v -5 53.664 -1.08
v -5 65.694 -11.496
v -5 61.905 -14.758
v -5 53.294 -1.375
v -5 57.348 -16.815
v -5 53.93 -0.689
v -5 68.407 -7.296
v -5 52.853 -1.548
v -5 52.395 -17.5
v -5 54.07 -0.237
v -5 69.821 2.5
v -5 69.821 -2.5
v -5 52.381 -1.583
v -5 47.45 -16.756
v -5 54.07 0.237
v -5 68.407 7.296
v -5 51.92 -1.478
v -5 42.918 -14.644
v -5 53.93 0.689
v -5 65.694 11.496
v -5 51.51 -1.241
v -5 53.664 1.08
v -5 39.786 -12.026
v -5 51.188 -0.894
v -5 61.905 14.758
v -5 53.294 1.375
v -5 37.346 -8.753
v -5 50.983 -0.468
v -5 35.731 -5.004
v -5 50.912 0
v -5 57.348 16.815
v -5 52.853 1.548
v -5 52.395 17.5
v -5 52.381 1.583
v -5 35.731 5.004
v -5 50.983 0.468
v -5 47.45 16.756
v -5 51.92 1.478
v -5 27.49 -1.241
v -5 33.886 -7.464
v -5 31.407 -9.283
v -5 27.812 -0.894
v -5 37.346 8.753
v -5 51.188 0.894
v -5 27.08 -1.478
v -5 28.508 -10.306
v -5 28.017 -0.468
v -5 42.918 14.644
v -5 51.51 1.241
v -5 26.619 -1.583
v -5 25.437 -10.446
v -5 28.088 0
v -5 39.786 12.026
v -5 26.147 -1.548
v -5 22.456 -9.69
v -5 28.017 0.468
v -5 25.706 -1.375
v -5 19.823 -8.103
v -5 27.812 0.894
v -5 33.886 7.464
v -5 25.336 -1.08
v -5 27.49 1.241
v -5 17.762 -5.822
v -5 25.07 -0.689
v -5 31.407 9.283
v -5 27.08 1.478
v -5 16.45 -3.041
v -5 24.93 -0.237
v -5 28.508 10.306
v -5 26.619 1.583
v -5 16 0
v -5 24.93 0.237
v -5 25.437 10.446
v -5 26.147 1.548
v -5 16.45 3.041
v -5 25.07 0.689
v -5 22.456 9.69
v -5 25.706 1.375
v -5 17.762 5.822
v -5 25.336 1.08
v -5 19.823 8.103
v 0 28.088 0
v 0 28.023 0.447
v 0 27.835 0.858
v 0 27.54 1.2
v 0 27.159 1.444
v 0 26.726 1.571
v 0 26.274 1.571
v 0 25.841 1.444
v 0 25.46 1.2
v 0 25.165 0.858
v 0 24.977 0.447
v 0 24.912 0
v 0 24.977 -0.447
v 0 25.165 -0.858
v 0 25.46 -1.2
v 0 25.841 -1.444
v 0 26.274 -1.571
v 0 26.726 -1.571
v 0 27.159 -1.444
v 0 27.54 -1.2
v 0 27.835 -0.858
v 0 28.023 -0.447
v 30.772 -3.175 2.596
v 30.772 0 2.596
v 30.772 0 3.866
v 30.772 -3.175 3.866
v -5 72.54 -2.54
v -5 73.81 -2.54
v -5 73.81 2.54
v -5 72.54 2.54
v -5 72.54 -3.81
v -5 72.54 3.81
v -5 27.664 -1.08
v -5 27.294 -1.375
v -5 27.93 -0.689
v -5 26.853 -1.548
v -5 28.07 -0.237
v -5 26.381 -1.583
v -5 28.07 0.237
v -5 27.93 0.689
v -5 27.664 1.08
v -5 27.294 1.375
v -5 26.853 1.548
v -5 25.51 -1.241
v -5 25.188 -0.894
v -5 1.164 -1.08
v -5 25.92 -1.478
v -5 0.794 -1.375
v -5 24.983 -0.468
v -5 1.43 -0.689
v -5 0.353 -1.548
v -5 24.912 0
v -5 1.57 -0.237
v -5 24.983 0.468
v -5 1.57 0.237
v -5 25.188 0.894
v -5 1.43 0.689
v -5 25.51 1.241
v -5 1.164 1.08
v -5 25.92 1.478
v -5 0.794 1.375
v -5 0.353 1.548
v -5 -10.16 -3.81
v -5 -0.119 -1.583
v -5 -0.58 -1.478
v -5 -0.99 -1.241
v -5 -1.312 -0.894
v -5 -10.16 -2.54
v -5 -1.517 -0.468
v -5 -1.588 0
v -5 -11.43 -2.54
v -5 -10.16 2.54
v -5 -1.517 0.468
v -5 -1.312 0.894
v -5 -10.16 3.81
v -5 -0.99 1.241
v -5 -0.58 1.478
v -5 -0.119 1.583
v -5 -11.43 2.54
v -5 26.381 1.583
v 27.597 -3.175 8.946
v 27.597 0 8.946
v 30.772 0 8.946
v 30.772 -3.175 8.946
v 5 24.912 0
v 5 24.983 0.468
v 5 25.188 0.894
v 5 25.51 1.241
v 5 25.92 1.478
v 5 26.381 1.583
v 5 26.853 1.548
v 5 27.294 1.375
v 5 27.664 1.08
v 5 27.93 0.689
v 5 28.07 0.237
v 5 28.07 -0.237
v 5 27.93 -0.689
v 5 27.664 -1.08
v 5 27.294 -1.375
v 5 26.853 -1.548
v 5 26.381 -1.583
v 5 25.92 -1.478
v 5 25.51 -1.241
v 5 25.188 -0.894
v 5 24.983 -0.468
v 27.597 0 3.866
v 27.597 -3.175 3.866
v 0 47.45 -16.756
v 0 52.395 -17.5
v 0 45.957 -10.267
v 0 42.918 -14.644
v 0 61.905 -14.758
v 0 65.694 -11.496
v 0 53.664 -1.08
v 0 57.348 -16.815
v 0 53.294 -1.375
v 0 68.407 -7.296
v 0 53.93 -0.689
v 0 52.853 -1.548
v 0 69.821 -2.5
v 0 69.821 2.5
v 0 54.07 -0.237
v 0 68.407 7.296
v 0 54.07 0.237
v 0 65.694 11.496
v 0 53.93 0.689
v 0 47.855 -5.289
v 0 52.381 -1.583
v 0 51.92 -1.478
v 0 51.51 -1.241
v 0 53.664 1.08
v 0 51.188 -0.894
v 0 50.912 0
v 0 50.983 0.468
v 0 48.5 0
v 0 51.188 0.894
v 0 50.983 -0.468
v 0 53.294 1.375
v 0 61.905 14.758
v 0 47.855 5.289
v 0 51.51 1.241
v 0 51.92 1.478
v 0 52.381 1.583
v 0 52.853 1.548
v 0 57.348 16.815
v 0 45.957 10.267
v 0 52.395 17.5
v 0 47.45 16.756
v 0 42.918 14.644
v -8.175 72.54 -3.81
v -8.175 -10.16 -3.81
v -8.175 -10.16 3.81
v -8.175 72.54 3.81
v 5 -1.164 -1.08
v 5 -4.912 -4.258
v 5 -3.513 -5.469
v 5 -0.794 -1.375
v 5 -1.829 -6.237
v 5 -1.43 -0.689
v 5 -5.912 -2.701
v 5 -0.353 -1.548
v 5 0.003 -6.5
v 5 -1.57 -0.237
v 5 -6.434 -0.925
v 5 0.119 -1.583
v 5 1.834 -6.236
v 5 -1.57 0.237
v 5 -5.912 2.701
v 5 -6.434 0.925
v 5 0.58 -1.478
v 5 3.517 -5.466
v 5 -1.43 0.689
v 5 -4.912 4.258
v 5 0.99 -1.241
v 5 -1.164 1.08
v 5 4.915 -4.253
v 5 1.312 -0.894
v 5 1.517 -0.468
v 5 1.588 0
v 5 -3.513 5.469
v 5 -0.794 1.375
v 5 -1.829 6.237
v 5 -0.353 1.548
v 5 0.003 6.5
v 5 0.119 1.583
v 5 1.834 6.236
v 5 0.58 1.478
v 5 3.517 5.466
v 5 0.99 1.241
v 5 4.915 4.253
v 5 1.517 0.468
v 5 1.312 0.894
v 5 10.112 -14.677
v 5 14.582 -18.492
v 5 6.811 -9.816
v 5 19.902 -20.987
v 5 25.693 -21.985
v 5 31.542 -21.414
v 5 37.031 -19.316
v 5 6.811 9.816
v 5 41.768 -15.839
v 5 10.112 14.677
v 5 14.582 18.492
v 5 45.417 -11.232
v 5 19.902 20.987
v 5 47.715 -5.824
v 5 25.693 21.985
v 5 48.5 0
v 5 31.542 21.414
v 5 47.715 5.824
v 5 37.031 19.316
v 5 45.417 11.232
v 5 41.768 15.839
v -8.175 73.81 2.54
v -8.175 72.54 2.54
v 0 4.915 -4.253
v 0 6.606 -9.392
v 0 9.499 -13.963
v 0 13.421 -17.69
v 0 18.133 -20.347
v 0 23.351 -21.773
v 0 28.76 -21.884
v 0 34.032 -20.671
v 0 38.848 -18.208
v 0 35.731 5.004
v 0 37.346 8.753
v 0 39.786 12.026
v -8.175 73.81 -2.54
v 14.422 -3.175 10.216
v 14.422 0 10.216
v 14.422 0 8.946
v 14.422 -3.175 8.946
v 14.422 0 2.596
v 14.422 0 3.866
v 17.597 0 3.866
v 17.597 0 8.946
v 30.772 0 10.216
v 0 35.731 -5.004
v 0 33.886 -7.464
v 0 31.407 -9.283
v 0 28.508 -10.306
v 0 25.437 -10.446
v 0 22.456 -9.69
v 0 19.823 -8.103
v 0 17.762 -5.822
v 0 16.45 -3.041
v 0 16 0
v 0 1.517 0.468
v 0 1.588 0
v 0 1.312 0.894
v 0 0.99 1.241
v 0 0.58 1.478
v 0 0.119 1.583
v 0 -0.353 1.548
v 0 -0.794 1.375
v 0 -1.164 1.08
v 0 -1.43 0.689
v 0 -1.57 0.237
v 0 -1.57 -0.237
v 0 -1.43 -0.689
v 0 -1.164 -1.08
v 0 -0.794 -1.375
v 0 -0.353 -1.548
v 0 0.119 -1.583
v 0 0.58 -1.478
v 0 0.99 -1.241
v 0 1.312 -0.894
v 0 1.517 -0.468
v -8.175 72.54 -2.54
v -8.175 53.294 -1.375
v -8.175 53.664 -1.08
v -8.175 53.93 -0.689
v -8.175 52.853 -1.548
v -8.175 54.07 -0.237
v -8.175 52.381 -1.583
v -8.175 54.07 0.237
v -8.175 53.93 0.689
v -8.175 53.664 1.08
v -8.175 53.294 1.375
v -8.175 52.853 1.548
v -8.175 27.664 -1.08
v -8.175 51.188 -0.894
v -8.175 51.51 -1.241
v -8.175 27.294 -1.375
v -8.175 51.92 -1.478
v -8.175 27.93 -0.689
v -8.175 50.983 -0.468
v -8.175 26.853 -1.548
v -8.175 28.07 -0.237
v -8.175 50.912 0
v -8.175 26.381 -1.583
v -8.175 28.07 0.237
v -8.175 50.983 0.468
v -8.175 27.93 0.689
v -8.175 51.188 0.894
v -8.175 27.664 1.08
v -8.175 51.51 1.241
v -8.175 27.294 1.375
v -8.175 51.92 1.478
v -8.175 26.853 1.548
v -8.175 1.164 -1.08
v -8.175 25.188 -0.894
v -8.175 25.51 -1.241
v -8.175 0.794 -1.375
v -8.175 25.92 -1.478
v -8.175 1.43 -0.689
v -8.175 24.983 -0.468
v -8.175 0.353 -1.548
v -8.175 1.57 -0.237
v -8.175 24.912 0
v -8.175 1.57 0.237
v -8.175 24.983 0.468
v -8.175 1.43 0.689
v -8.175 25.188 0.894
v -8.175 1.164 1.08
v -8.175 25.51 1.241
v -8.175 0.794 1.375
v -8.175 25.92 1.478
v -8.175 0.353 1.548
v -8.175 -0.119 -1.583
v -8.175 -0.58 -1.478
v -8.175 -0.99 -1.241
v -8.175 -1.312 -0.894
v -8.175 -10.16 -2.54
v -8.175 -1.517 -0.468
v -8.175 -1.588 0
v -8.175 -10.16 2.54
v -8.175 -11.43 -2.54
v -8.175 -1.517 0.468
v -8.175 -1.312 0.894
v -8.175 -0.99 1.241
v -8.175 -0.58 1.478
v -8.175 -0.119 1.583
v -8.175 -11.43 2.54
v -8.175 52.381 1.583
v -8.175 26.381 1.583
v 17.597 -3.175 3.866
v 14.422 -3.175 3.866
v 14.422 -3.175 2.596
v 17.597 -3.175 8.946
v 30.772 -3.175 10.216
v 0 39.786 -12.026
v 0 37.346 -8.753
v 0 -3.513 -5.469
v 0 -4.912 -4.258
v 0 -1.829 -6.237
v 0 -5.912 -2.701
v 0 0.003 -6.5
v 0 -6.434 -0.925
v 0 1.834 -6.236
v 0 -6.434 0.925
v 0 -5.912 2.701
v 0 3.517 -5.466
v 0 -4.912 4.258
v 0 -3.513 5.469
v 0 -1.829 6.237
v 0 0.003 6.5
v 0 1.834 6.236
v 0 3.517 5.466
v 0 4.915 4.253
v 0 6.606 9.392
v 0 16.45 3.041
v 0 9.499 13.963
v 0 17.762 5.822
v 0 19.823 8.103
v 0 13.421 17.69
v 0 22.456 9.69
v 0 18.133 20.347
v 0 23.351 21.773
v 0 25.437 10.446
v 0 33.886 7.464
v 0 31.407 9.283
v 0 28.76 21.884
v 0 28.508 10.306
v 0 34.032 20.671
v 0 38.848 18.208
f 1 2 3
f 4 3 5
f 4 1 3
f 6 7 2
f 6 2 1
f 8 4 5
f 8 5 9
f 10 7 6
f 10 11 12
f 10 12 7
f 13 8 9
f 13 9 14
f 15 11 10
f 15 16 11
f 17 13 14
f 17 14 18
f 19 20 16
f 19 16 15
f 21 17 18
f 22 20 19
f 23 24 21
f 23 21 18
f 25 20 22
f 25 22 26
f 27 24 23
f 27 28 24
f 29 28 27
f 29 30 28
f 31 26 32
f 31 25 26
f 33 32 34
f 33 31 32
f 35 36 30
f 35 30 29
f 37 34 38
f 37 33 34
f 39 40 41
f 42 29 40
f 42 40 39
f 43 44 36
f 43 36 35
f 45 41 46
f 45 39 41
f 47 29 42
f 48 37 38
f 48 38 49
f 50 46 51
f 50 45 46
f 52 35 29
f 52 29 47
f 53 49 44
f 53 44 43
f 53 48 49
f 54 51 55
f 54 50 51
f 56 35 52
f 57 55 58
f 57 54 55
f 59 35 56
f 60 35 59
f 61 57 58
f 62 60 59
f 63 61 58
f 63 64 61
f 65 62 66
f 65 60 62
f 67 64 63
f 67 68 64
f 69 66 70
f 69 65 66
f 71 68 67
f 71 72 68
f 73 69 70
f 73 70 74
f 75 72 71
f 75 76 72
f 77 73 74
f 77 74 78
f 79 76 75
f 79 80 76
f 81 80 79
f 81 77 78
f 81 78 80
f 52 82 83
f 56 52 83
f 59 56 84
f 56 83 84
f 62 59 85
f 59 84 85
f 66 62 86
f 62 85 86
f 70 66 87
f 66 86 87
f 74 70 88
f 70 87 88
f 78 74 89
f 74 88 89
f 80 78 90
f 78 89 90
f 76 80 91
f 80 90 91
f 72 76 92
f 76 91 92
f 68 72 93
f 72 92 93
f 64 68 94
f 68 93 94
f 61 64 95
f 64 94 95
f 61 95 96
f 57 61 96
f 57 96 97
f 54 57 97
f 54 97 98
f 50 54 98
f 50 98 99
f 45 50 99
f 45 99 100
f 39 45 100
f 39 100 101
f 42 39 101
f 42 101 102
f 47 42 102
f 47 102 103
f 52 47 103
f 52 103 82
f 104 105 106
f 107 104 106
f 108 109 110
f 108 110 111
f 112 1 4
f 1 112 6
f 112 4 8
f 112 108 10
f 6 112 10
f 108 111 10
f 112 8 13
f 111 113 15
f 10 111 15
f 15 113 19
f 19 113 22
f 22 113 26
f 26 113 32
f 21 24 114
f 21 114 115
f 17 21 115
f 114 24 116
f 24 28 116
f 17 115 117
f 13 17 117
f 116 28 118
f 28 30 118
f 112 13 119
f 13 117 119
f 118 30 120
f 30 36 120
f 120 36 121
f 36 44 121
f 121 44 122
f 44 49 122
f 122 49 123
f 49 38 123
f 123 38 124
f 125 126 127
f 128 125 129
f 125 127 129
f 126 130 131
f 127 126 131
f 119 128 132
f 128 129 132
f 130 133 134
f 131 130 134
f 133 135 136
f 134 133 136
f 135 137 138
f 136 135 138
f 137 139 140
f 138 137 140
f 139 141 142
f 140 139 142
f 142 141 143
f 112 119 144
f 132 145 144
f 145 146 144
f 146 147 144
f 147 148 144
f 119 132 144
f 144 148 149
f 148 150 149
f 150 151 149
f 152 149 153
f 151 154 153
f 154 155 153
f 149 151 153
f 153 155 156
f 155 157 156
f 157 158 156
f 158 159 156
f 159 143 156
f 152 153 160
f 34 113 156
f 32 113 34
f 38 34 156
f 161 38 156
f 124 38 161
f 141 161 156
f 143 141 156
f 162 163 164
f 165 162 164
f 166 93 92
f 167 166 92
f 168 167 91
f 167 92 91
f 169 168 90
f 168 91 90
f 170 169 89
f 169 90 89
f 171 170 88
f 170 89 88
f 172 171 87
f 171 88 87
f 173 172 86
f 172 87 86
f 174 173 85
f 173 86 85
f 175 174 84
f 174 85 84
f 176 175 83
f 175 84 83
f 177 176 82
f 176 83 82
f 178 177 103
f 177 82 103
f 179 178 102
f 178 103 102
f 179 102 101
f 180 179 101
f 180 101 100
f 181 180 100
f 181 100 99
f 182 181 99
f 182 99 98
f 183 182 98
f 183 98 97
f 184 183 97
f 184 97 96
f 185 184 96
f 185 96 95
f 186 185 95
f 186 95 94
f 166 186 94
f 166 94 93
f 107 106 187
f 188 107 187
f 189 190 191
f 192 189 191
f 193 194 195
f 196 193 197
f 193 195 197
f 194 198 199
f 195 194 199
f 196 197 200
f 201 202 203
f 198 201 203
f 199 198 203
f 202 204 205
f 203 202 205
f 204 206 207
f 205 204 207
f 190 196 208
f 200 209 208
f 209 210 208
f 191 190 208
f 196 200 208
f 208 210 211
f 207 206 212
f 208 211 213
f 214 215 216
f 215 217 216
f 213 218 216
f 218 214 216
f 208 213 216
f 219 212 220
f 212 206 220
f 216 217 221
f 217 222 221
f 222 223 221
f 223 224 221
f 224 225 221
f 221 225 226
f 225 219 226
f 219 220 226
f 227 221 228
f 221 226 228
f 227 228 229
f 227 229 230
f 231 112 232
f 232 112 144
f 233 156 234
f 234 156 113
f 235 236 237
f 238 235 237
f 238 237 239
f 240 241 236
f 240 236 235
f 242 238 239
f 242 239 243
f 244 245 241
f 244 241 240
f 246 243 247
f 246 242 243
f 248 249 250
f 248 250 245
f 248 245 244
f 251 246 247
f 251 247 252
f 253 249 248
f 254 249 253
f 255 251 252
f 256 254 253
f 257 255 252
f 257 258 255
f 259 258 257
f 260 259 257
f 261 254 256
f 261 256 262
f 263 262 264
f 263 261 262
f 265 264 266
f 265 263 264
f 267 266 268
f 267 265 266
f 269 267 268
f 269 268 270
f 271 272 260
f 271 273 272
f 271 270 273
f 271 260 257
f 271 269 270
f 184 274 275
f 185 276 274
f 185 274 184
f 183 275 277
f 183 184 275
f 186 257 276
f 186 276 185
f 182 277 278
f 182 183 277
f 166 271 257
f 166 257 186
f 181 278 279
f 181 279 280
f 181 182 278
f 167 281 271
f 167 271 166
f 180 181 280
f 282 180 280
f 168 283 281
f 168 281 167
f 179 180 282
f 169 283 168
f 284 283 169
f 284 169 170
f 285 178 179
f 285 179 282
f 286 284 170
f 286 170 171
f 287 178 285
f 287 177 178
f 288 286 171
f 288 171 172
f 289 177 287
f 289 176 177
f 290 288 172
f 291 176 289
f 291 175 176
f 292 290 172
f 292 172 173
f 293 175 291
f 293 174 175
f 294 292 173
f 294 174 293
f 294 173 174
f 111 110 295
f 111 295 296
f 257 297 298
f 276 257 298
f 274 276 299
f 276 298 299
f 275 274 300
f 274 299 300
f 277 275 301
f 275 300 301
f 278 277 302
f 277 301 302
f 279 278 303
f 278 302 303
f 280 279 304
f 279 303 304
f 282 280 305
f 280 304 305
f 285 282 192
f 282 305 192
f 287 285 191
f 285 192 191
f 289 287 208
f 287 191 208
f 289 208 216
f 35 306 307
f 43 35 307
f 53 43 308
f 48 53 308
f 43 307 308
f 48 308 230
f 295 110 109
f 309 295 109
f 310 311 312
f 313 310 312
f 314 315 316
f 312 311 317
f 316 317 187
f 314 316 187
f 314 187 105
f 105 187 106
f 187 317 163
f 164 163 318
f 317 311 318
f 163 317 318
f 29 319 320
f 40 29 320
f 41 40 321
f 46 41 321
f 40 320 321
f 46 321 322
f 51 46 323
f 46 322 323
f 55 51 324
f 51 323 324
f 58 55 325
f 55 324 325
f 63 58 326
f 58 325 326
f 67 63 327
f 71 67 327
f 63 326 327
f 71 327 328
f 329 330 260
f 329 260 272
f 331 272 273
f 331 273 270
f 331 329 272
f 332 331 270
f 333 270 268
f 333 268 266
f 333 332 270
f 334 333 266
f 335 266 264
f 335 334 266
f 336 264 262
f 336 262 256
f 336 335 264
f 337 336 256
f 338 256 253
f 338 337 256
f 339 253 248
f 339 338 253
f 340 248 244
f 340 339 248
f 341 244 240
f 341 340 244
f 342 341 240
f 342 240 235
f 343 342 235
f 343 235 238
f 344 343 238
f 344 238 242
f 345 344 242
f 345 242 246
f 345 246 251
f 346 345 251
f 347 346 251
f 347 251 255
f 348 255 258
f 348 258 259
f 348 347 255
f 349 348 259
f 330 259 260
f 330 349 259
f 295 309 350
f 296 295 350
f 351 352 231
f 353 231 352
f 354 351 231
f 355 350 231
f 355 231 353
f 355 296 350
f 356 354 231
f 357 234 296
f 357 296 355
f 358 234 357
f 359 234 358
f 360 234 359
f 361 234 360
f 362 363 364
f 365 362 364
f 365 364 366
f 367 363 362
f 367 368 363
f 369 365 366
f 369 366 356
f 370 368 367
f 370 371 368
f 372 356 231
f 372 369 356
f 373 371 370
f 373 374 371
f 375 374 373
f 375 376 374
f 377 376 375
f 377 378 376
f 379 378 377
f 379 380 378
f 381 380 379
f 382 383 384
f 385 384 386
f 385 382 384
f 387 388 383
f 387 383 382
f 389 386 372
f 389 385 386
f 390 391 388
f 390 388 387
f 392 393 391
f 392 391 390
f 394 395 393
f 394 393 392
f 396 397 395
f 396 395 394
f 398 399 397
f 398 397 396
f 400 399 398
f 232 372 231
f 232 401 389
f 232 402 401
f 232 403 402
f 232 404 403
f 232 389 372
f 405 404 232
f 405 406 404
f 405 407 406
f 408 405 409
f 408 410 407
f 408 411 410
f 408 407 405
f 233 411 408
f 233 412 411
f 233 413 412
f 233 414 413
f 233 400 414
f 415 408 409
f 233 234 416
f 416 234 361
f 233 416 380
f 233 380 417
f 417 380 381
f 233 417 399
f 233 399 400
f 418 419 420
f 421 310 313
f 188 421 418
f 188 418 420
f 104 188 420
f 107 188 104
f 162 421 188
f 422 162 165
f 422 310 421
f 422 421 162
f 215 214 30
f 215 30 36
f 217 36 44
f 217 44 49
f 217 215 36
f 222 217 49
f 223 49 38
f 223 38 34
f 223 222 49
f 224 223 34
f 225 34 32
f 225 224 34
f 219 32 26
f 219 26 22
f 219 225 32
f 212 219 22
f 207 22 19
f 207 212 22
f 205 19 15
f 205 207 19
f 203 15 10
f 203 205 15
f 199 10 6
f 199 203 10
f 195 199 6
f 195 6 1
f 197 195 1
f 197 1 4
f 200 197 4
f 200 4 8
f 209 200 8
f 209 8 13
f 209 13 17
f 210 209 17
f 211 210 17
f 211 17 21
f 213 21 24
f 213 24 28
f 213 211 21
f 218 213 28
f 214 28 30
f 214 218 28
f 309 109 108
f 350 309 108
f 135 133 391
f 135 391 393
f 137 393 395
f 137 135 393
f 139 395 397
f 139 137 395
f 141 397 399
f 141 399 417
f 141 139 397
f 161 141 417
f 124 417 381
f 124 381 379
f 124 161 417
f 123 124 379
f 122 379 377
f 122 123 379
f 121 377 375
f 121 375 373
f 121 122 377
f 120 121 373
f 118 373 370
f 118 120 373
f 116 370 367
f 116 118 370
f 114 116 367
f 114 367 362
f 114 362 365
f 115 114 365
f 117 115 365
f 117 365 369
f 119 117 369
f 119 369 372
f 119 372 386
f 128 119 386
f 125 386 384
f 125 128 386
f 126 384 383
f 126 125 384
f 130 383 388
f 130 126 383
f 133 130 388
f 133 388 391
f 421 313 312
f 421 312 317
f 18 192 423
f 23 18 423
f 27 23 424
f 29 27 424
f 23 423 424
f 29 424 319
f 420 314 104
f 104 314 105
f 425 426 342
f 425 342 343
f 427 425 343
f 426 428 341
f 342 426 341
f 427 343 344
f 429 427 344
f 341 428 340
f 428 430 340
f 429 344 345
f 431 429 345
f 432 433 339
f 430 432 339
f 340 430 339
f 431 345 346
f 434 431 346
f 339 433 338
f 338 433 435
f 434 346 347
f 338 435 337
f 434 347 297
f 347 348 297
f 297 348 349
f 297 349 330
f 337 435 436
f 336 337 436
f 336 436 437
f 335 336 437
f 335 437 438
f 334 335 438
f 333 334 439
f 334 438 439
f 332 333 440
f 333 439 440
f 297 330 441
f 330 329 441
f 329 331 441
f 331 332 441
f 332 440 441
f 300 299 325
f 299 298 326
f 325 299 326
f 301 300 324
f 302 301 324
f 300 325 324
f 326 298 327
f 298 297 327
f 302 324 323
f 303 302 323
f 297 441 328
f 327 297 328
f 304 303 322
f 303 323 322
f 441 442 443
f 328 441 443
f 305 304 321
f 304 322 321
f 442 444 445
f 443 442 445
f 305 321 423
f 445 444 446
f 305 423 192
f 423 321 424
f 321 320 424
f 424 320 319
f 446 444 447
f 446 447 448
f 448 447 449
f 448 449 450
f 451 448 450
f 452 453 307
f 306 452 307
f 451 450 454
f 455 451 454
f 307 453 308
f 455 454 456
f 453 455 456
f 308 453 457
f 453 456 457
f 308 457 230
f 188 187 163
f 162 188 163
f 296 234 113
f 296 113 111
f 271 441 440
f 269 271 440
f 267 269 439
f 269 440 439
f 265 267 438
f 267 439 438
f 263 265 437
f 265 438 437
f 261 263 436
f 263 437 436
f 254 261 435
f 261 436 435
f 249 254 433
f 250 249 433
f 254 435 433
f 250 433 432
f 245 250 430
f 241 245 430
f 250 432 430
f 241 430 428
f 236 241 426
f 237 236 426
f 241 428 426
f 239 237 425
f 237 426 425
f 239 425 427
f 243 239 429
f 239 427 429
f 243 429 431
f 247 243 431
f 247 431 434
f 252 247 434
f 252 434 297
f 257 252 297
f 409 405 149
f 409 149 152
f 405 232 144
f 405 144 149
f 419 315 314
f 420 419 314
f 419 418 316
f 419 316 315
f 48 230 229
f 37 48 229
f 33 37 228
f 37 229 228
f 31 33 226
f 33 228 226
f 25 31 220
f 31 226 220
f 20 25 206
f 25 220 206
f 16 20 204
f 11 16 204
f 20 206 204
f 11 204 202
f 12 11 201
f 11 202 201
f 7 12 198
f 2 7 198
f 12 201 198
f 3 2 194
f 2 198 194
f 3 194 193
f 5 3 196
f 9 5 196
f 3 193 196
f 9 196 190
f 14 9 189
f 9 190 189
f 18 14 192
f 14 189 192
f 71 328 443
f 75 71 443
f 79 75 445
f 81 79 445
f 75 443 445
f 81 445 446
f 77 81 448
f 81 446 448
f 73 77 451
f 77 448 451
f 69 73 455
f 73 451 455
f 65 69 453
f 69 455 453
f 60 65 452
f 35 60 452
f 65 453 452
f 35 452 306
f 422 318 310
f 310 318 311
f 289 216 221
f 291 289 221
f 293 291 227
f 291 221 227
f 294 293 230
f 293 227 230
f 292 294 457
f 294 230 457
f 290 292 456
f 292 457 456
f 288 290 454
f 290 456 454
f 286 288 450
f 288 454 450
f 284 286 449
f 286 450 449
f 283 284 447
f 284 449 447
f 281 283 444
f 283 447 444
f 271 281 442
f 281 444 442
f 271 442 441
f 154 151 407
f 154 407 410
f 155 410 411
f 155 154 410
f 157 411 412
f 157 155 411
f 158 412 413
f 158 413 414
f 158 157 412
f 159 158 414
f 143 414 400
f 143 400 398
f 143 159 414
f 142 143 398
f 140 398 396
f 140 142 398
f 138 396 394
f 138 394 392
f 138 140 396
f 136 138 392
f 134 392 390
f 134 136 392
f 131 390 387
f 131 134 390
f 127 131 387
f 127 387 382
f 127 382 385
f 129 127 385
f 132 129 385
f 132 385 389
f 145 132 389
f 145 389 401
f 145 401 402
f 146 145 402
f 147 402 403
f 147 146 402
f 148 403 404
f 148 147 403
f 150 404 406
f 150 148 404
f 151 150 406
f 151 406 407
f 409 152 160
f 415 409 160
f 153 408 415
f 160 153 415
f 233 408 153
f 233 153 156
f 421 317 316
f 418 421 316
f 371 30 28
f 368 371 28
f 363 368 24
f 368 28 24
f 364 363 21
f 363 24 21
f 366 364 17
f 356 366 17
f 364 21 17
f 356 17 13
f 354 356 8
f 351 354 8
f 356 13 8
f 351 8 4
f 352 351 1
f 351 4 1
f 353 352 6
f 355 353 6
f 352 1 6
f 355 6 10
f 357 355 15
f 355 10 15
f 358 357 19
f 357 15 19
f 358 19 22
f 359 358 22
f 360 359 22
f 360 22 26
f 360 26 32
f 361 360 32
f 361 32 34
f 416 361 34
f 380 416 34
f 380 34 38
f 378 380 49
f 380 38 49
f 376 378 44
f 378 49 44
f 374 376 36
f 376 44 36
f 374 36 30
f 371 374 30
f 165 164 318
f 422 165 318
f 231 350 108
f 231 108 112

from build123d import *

# Parameters (mm, degrees)
F0_R     = 4.5
F0_R_2   = 1.5875
F1_DEPTH = 5
F2_R     = 1.5875
F3_DEPTH = 5
F4_R     = 1.5875
F4_W     = 1.27
F4_H     = 2.54
F5_DEPTH = 3.175
F7_DEPTH = 3.175


with BuildPart() as f1:
    # F0 (on Right) → F1 (new body)
    with BuildSketch(Plane.YZ):
        with BuildLine():
            ThreePointArc((4.9150943396, 4.2534512613), (6.0908994905, 2.2695689891), (6.5, 0))
            ThreePointArc((6.5, 0), (6.0908994905, -2.2695689891), (4.9150943396, -4.2534512613))
            ThreePointArc((4.9150943396, -4.2534512613), (28.6368288972, -21.8959805047), (48.5, 0))
            ThreePointArc((48.5, 0), (28.6368288972, 21.8959805047), (4.9150943396, 4.2534512613))
        make_face()
        with BuildLine():
            ThreePointArc((46.5, 0), (26.5, -20), (6.5, 0))
            ThreePointArc((6.5, 0), (26.5, 20), (46.5, 0))
        make_face(mode=Mode.SUBTRACT)
        with BuildLine():
            ThreePointArc((46.5, 0), (26.5, 20), (6.5, 0))
            ThreePointArc((6.5, 0), (26.5, -20), (46.5, 0))
        make_face()
        with BuildLine():
            ThreePointArc((28.0875, 0), (26.5, -1.5875), (24.9125, 0))
            ThreePointArc((24.9125, 0), (26.5, 1.5875), (28.0875, 0))
        make_face(mode=Mode.SUBTRACT)
        with BuildLine():
            ThreePointArc((4.5, 0), (4.6040194953, 2.1368288972), (4.9150943396, 4.2534512613))
            ThreePointArc((4.9150943396, 4.2534512613), (-6.5, 0), (4.9150943396, -4.2534512613))
            ThreePointArc((4.9150943396, -4.2534512613), (4.6040194953, -2.1368288972), (4.5, 0))
        make_face()
        Circle(F0_R, mode=Mode.SUBTRACT)
        Circle(F0_R)
        Circle(F0_R_2, mode=Mode.SUBTRACT)
        with BuildLine():
            Line((4.5, 0), (6.5, 0))
            ThreePointArc((6.5, 0), (6.0908994905, 2.2695689891), (4.9150943396, 4.2534512613))
            ThreePointArc((4.9150943396, 4.2534512613), (4.6040194953, 2.1368288972), (4.5, 0))
        make_face()
        with BuildLine():
            ThreePointArc((4.9150943396, -4.2534512613), (6.0908994905, -2.2695689891), (6.5, 0))
            Line((6.5, 0), (4.5, 0))
            ThreePointArc((4.5, 0), (4.6040194953, -2.1368288972), (4.9150943396, -4.2534512613))
        make_face()
    extrude(amount=F1_DEPTH)

    # F2 (on face) → F3 (join)
    with BuildSketch(Plane(origin=(0, 0, 0), x_dir=(0, -1, 0), z_dir=(-1, 0, 0))):
        with BuildLine():
            ThreePointArc((-44.1875, -13.0825205427), (-47.3940781084, -6.887488657), (-48.5, 0))
            ThreePointArc((-48.5, 0), (-47.3940781084, 6.887488657), (-44.1875, 13.0825205427))
            ThreePointArc((-44.1875, 13.0825205427), (-68, 0), (-44.1875, -13.0825205427))
        make_face()
        with Locations((-52.5, 0)):
            Circle(F2_R, mode=Mode.SUBTRACT)
        with BuildLine():
            ThreePointArc((-35.7307692308, 5.004288102), (-35.1836560085, 2.5286816267), (-35, 0))
            ThreePointArc((-35, 0), (-35.1836560085, -2.5286816267), (-35.7307692308, -5.004288102))
            ThreePointArc((-35.7307692308, -5.004288102), (-23.9186318476, -10.1777472194), (-16, 0))
            ThreePointArc((-16, 0), (-23.9186318476, 10.1777472194), (-35.7307692308, 5.004288102))
        make_face()
        with BuildLine():
            ThreePointArc((-35, 0), (-26.5, 8.5), (-18, 0))
            ThreePointArc((-18, 0), (-26.5, -8.5), (-35, 0))
        make_face(mode=Mode.SUBTRACT)
        with BuildLine():
            ThreePointArc((-35, 0), (-26.5, -8.5), (-18, 0))
            ThreePointArc((-18, 0), (-26.5, 8.5), (-35, 0))
        make_face()
        with BuildLine():
            ThreePointArc((-24.9125, 0), (-26.5, -1.5875), (-28.0875, 0))
            ThreePointArc((-28.0875, 0), (-26.5, 1.5875), (-24.9125, 0))
        make_face(mode=Mode.SUBTRACT)
        with BuildLine():
            ThreePointArc((-44.1875, -13.0825205427), (-68, 0), (-44.1875, 13.0825205427))
            ThreePointArc((-44.1875, 13.0825205427), (-43.5707428158, 13.8776705436), (-42.9182692308, 14.643784875))
            ThreePointArc((-42.9182692308, 14.643784875), (-70, 0), (-42.9182692308, -14.643784875))
            ThreePointArc((-42.9182692308, -14.643784875), (-43.5707428158, -13.8776705436), (-44.1875, -13.0825205427))
        make_face()
        with BuildLine():
            ThreePointArc((-44.1875, -13.0825205427), (-38.9151969098, -7.4634526193), (-37, 0))
            Line((-37, 0), (-48.5, 0))
            ThreePointArc((-48.5, 0), (-47.3940781084, -6.887488657), (-44.1875, -13.0825205427))
        make_face()
        with BuildLine():
            Line((-48.5, 0), (-37, 0))
            ThreePointArc((-37, 0), (-38.9151969098, 7.4634526193), (-44.1875, 13.0825205427))
            ThreePointArc((-44.1875, 13.0825205427), (-47.3940781084, 6.887488657), (-48.5, 0))
        make_face()
        with BuildLine():
            ThreePointArc((-44.1875, 13.0825205427), (-38.9151969098, 7.4634526193), (-37, 0))
            ThreePointArc((-37, 0), (-36.6777472194, 2.5813681524), (-35.7307692308, 5.004288102))
            ThreePointArc((-35.7307692308, 5.004288102), (-38.4706283815, 10.4607233015), (-42.9182692308, 14.643784875))
            ThreePointArc((-42.9182692308, 14.643784875), (-43.5707428158, 13.8776705436), (-44.1875, 13.0825205427))
        make_face()
        with BuildLine():
            ThreePointArc((-35.7307692308, -5.004288102), (-36.6777472194, -2.5813681524), (-37, 0))
            ThreePointArc((-37, 0), (-38.9151969098, -7.4634526193), (-44.1875, -13.0825205427))
            ThreePointArc((-44.1875, -13.0825205427), (-43.5707428158, -13.8776705436), (-42.9182692308, -14.643784875))
            ThreePointArc((-42.9182692308, -14.643784875), (-38.4706283815, -10.4607233015), (-35.7307692308, -5.004288102))
        make_face()
        with BuildLine():
            ThreePointArc((-35.7307692308, -5.004288102), (-35.1836560085, -2.5286816267), (-35, 0))
            Line((-35, 0), (-37, 0))
            ThreePointArc((-37, 0), (-36.6777472194, -2.5813681524), (-35.7307692308, -5.004288102))
        make_face()
        with BuildLine():
            Line((-37, 0), (-35, 0))
            ThreePointArc((-35, 0), (-35.1836560085, 2.5286816267), (-35.7307692308, 5.004288102))
            ThreePointArc((-35.7307692308, 5.004288102), (-36.6777472194, 2.5813681524), (-37, 0))
        make_face()
    extrude(amount=F3_DEPTH)


with BuildPart() as f5:
    # F4 (on face) → F5 (new body)
    with BuildSketch(Plane(origin=(-5, 0, 0), x_dir=(0, -1, 0), z_dir=(-1, 0, 0))):
        with BuildLine():
            ThreePointArc((-69.5802195536, 3.81), (-69.8947383163, 1.9165278255), (-70, 0))
            ThreePointArc((-70, 0), (-69.8947383163, -1.9165278255), (-69.5802195536, -3.81))
            Line((-69.5802195536, -3.81), (-16.7156298108, -3.81))
            ThreePointArc((-16.7156298108, -3.81), (-16, 0), (-16.7156298108, 3.81))
            Line((-16.7156298108, 3.81), (-69.5802195536, 3.81))
        make_face()
        with BuildLine():
            ThreePointArc((-54.0875, 0), (-52.5, 1.5875), (-50.9125, 0))
            ThreePointArc((-50.9125, 0), (-52.5, -1.5875), (-54.0875, 0))
        make_face(mode=Mode.SUBTRACT)
        with Locations((-26.5, 0)):
            Circle(F4_R, mode=Mode.SUBTRACT)
        with BuildLine():
            Line((-72.54, 0), (-70, 0))
            ThreePointArc((-70, 0), (-69.8947383163, 1.9165278255), (-69.5802195536, 3.81))
            Line((-69.5802195536, 3.81), (-72.54, 3.81))
            Line((-72.54, 3.81), (-72.54, 2.54))
            Line((-72.54, 2.54), (-72.54, 0))
        make_face()
        with BuildLine():
            ThreePointArc((-69.5802195536, -3.81), (-69.8947383163, -1.9165278255), (-70, 0))
            Line((-70, 0), (-72.54, 0))
            Line((-72.54, 0), (-72.54, -2.54))
            Line((-72.54, -2.54), (-72.54, -3.81))
            Line((-72.54, -3.81), (-69.5802195536, -3.81))
        make_face()
        with Locations((-73.175, -1.27)):
            Rectangle(F4_W, F4_H)
        with Locations((-73.175, 1.27)):
            Rectangle(F4_W, F4_H)
        with BuildLine():
            Line((10.16, 3.81), (-16.7156298108, 3.81))
            ThreePointArc((-16.7156298108, 3.81), (-16, 0), (-16.7156298108, -3.81))
            Line((-16.7156298108, -3.81), (0, -3.81))
            Line((0, -3.81), (10.16, -3.81))
            Line((10.16, -3.81), (10.16, -2.54))
            Line((10.16, -2.54), (10.16, 0))
            Line((10.16, 0), (10.16, 2.54))
            Line((10.16, 2.54), (10.16, 3.81))
        make_face()
        Circle(F4_R, mode=Mode.SUBTRACT)
        with Locations((10.795, 1.27)):
            Rectangle(F4_W, F4_H)
        with Locations((10.795, -1.27)):
            Rectangle(F4_W, F4_H)
    extrude(amount=F5_DEPTH)


with BuildPart() as f7:
    # F6 (on Front) → F7 (new body)
    with BuildSketch(Plane.XZ):
        Polygon((30.7720199436, 8.9457957841), (30.7720199436, 10.2157957841), (22.5970199436, 10.2157957841), (22.5970199436, 2.5957957841), (30.7720199436, 2.5957957841), (30.7720199436, 3.8657957841), (27.5970199436, 3.8657957841), (27.5970199436, 8.9457957841), align=None)
        Polygon((22.5970199436, 2.5957957841), (22.5970199436, 10.2157957841), (14.4220199436, 10.2157957841), (14.4220199436, 8.9457957841), (17.5970199436, 8.9457957841), (17.5970199436, 3.8657957841), (14.4220199436, 3.8657957841), (14.4220199436, 2.5957957841), align=None)
    extrude(amount=F7_DEPTH)


solid = Compound([f1.part, f5.part, f7.part])
